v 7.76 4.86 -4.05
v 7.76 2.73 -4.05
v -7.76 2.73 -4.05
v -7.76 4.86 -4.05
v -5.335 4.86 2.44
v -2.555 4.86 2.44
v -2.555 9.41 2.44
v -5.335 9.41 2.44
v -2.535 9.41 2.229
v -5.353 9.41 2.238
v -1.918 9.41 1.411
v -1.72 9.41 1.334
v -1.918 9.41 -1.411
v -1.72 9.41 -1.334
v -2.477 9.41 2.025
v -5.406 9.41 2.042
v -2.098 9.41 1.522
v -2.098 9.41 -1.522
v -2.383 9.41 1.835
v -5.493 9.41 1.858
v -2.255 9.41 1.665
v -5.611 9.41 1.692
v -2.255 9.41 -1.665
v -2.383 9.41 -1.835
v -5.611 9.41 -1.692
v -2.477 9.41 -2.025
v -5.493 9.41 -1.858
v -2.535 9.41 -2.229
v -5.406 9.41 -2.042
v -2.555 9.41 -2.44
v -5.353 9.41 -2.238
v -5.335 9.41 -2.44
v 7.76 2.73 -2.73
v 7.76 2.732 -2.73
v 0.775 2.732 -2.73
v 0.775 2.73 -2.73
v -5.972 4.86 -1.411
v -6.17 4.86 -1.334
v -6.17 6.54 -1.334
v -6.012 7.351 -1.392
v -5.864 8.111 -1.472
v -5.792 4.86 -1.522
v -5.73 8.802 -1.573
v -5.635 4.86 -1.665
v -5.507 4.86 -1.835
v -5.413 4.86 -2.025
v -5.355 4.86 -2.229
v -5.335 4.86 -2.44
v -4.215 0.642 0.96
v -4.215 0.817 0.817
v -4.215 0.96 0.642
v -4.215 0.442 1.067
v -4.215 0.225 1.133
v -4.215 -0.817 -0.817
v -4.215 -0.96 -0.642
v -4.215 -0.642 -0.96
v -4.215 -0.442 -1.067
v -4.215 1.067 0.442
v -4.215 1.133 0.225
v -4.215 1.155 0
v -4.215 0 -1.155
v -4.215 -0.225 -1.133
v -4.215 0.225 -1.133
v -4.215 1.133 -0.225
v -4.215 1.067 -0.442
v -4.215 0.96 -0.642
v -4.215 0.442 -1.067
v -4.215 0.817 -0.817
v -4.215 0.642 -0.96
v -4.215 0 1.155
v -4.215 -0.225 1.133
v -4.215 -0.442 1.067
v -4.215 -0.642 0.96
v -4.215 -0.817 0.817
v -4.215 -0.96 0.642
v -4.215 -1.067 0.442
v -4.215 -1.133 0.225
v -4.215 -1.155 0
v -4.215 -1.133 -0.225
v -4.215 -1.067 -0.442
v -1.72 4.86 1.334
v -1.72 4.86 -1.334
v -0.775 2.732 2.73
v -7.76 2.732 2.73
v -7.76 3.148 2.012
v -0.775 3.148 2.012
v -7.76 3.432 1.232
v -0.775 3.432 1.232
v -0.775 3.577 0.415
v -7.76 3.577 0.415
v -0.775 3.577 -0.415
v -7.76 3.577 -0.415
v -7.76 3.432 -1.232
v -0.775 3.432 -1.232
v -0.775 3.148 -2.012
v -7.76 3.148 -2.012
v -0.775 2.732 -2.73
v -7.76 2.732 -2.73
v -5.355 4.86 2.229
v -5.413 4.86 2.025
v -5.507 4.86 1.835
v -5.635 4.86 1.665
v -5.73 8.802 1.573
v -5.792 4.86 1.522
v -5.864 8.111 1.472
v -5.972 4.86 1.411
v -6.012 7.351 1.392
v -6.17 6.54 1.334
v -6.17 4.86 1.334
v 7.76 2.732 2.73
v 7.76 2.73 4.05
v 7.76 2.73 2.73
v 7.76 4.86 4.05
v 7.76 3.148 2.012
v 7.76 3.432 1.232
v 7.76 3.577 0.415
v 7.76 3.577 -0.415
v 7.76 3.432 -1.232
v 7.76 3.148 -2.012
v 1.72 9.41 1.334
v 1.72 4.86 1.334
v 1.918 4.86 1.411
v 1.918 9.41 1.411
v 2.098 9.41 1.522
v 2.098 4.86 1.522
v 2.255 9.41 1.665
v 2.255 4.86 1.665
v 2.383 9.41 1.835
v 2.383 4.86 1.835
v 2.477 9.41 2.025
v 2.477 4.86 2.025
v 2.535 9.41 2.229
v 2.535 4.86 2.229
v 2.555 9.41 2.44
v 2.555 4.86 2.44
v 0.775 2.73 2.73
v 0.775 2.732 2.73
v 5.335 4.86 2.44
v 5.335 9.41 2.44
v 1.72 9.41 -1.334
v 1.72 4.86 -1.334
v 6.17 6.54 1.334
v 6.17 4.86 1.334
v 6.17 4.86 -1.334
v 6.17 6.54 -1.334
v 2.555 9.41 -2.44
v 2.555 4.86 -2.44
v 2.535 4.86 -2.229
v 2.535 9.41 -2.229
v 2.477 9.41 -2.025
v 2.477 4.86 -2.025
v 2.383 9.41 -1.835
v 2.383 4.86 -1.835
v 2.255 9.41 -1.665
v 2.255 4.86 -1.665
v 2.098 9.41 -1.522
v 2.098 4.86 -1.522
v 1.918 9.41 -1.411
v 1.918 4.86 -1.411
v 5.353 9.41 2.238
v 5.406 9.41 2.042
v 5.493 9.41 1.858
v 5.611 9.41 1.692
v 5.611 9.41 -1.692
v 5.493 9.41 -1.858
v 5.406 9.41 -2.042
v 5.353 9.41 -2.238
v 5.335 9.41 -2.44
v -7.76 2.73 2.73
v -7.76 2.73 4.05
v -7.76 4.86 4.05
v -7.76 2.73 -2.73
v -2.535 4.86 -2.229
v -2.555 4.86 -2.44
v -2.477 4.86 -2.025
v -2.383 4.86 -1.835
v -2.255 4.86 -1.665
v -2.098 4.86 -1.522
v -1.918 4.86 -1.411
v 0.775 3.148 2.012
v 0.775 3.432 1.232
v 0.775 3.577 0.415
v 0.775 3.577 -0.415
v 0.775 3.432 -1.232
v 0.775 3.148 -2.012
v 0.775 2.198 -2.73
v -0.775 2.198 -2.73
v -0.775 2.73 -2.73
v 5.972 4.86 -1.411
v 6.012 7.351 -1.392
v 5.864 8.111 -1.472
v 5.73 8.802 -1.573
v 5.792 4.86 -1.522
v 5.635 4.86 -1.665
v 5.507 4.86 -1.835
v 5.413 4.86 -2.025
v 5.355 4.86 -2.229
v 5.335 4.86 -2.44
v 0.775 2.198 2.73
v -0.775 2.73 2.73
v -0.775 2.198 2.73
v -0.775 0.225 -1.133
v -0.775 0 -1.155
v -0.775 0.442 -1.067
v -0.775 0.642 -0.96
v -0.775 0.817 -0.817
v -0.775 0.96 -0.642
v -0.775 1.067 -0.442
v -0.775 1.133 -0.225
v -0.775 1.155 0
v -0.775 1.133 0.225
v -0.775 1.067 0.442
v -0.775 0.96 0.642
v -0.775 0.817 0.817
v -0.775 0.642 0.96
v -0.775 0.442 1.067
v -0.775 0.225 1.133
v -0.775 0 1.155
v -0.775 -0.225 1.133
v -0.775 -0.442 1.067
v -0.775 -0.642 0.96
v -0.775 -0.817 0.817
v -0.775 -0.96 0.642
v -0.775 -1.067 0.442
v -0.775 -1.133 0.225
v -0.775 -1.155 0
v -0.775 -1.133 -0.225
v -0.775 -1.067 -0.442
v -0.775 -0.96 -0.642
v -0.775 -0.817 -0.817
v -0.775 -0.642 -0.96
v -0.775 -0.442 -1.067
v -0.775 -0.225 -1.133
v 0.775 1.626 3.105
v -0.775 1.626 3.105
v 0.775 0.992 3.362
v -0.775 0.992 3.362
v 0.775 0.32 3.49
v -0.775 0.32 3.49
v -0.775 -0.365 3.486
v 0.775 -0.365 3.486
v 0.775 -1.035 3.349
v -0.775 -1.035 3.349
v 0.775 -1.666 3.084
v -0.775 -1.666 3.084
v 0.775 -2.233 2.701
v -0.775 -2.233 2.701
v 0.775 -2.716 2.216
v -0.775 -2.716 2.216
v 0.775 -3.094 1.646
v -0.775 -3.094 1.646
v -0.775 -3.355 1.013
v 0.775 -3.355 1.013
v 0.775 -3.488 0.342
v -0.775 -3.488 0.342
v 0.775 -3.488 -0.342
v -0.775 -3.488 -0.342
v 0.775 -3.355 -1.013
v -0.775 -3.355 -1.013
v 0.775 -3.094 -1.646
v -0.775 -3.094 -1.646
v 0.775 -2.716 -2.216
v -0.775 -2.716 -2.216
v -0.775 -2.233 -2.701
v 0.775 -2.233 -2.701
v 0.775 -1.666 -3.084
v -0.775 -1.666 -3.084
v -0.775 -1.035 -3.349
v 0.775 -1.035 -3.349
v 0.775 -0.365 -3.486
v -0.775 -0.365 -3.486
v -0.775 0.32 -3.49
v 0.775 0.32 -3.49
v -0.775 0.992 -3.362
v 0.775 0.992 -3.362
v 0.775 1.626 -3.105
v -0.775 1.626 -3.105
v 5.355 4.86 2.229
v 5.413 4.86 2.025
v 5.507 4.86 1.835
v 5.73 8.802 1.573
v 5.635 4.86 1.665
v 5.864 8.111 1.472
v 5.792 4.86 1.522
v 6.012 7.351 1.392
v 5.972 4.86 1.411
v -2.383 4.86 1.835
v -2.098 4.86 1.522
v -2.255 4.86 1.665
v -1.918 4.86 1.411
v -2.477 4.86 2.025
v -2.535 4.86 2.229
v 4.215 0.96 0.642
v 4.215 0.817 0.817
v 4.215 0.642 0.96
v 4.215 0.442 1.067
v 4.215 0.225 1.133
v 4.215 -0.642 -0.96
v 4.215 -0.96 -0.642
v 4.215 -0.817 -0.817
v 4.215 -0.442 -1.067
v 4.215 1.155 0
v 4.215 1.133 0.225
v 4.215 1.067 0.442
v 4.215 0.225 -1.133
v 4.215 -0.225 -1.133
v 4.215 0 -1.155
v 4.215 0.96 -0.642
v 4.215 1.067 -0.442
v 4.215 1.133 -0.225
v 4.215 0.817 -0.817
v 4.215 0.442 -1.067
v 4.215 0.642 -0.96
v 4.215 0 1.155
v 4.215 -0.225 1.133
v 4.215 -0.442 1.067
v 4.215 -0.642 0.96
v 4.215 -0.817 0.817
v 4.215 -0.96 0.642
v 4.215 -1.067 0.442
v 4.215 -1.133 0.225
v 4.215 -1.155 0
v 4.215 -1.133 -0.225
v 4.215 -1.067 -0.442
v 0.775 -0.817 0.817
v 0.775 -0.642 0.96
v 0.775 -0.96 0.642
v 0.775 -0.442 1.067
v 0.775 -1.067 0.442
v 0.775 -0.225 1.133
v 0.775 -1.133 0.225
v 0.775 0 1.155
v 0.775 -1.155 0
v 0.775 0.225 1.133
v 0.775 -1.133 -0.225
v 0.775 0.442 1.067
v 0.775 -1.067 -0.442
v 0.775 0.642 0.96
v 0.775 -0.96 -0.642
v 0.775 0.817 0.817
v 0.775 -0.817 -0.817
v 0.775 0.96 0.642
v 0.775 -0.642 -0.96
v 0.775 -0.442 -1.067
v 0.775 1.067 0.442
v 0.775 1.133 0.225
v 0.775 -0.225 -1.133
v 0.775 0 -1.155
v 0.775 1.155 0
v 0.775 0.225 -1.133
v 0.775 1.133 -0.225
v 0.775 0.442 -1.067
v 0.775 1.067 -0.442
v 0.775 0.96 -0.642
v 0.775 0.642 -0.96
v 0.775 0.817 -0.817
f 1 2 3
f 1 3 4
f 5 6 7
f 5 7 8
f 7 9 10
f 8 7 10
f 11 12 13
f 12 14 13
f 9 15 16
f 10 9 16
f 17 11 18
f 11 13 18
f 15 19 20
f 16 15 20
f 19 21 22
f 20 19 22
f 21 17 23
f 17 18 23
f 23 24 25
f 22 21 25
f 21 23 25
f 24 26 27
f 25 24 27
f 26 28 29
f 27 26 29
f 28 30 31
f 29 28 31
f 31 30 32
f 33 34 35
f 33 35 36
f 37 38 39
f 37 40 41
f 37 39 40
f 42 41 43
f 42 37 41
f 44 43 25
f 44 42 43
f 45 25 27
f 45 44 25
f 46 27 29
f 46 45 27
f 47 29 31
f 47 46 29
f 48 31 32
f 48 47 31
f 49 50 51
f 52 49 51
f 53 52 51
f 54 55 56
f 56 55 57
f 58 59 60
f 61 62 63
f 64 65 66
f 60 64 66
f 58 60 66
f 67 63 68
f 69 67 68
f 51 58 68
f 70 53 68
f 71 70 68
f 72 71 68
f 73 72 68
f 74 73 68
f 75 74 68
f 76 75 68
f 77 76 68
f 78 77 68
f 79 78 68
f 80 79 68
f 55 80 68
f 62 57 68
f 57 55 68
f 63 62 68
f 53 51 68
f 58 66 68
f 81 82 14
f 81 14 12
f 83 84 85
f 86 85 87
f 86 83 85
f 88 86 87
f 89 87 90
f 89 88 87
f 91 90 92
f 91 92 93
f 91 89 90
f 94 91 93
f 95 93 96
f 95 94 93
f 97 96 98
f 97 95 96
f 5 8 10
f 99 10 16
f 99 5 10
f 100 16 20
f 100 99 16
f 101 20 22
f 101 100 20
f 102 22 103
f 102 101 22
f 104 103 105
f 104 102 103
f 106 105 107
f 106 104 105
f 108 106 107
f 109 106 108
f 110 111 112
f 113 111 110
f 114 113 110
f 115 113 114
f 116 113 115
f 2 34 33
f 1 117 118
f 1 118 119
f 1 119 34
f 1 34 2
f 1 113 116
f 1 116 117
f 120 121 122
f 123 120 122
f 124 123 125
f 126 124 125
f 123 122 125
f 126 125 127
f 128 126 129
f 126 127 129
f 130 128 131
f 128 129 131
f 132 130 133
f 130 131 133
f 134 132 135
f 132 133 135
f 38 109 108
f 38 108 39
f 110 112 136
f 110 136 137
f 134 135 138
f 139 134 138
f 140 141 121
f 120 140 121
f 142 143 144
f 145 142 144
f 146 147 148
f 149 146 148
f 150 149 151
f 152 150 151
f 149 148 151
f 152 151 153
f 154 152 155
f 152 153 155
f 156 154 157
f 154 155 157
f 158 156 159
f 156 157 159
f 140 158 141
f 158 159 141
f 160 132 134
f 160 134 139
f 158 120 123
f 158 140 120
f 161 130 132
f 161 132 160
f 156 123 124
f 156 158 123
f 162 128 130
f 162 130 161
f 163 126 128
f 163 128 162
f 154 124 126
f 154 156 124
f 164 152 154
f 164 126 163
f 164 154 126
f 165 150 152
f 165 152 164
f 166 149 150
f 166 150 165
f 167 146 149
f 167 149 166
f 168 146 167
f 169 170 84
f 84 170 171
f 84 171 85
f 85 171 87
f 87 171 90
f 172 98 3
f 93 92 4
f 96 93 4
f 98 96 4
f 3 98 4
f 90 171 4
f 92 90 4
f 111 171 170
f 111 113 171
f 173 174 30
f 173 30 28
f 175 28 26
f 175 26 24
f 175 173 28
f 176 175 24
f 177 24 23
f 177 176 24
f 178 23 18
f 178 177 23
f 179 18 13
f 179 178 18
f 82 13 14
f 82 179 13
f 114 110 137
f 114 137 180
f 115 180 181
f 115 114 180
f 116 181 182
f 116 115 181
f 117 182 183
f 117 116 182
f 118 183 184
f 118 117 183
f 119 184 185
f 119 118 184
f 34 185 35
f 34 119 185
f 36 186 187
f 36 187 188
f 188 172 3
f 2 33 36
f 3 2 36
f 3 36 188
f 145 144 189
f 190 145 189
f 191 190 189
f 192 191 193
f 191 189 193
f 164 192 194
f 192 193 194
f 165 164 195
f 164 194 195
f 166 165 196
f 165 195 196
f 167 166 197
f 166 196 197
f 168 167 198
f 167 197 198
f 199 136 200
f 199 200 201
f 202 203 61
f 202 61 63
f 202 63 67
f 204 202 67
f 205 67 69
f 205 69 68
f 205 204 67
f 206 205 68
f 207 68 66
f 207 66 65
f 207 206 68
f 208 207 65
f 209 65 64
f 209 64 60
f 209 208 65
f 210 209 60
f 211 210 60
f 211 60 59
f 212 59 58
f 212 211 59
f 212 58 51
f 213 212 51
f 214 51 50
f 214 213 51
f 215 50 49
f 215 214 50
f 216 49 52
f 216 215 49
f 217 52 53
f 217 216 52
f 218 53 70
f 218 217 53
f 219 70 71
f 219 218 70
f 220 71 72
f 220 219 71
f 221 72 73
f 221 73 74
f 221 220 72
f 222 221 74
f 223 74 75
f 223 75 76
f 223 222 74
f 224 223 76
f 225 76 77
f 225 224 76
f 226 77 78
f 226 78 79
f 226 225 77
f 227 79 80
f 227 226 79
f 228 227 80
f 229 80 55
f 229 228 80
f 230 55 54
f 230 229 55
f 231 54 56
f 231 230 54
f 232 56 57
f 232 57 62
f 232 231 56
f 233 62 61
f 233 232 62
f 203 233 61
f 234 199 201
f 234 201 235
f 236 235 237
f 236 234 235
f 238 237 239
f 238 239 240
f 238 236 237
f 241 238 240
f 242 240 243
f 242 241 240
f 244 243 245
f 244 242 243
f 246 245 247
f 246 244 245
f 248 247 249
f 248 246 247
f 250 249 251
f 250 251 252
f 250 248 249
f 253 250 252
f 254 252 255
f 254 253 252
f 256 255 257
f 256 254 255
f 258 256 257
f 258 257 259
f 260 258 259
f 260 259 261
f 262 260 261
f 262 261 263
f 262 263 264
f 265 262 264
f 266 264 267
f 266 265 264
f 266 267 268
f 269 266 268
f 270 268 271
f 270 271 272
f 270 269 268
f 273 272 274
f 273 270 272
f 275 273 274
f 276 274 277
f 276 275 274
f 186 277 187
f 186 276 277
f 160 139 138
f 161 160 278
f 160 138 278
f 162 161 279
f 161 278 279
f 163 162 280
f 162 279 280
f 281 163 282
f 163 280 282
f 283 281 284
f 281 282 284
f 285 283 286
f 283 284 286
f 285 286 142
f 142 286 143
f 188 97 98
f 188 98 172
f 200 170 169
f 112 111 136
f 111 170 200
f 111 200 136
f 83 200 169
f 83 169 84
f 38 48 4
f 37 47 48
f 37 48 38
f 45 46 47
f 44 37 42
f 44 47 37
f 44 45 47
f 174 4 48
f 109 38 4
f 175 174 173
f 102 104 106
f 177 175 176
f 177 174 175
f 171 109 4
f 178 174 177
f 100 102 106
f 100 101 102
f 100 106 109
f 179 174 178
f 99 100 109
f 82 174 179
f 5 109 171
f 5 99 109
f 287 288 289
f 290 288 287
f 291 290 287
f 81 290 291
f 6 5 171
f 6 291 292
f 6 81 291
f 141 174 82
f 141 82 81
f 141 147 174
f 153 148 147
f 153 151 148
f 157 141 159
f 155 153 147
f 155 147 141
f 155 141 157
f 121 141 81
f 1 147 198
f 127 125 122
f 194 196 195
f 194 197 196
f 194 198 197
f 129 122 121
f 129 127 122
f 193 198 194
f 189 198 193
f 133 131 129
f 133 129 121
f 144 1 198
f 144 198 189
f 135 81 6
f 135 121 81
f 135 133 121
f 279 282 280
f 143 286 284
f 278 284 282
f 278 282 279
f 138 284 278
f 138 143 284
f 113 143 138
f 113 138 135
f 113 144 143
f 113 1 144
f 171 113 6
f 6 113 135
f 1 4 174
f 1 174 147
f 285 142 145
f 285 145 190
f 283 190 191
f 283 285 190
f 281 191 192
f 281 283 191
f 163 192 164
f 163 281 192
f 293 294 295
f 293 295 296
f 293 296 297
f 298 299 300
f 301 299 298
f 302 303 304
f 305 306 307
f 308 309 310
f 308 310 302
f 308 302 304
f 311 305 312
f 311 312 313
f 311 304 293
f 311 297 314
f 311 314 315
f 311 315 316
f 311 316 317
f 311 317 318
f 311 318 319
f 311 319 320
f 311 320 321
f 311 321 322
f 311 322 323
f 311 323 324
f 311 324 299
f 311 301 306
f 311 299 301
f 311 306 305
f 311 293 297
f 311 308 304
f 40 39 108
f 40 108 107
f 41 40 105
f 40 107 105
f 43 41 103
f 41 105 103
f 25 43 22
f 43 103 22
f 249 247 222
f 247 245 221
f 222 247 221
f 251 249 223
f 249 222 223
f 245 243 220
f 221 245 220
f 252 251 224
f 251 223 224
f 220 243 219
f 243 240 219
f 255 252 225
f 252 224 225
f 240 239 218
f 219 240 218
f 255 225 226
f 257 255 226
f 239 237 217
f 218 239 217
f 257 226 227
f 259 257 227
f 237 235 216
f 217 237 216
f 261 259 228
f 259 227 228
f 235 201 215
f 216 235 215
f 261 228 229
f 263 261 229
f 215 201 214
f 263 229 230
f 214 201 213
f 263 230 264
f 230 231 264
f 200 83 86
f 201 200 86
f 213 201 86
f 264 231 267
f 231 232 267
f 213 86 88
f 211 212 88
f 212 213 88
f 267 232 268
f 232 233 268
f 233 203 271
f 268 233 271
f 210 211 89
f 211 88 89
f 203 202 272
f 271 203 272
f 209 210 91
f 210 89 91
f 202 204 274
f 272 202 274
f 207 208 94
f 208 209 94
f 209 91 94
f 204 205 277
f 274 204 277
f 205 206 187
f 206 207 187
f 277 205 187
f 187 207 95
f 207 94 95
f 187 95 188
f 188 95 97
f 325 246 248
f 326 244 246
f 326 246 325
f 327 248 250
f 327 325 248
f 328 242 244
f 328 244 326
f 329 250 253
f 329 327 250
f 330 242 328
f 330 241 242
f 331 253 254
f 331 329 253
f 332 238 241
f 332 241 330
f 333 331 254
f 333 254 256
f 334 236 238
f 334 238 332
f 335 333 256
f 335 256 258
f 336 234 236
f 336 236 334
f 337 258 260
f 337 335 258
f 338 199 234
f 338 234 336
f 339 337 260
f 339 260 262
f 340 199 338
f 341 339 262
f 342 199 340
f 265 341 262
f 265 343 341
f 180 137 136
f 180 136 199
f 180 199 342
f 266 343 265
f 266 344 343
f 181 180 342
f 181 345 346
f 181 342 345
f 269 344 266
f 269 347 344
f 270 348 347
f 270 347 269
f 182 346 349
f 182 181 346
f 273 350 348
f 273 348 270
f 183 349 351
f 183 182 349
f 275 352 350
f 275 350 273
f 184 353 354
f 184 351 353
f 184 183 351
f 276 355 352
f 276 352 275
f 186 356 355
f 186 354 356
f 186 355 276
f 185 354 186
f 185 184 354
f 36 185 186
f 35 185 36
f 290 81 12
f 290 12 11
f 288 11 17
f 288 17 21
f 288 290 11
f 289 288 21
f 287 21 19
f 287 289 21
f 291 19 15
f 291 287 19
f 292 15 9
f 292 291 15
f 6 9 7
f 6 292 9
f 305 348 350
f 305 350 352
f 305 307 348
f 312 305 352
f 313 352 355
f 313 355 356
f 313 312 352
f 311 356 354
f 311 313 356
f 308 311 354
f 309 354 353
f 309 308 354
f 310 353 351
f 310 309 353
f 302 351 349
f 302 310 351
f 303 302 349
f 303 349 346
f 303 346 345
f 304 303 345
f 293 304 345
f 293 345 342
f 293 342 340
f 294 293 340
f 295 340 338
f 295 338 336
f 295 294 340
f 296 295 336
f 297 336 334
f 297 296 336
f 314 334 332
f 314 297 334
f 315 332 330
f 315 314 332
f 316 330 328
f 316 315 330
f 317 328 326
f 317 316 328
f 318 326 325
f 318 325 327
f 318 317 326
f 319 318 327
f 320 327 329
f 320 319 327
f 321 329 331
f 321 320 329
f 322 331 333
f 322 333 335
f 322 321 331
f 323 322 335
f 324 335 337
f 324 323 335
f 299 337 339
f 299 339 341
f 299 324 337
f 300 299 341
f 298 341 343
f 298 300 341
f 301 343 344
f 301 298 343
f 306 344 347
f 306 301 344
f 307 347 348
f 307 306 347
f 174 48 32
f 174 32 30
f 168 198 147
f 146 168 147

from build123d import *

# Parameters (mm, degrees)
EXTRUDE_1_DEPTH     = 0.775
SKETCH_2_R          = 1.155
EXTRUDE_2_DEPTH     = 4.215
EXTRUDE_3_DEPTH     = 7.76
EXTRUDE_4_DEPTH     = 4.55
CUT_EXTRUDE_1_DEPTH = 2.5


with BuildPart() as part:
    # 스케치1 → 보스-돌출1 (new body, symmetric)
    with BuildSketch(Plane(origin=(0, 0, 0), x_dir=(0, 0, -1), z_dir=(1, 0, 0))):
        with BuildLine():
            Line((-2.73, 2.732106893), (-2.73, 2.198209499))
            ThreePointArc((-2.73, 2.198209499), (0, -3.505), (2.73, 2.198209499))
            Line((2.73, 2.198209499), (2.73, 2.732106893))
            ThreePointArc((2.73, 2.732106893), (0, 3.595), (-2.73, 2.732106893))
        make_face()
    extrude(amount=EXTRUDE_1_DEPTH, both=True)

    # 스케치2 → 보스-돌출2 (add, symmetric)
    with BuildSketch(Plane(origin=(0, 0, 0), x_dir=(0, 0, -1), z_dir=(1, 0, 0))):
        Circle(SKETCH_2_R)
    extrude(amount=EXTRUDE_2_DEPTH, both=True)

    # 스케치3 → 보스-돌출3 (add, symmetric)
    with BuildSketch(Plane(origin=(0, 0, 0), x_dir=(0, 0, -1), z_dir=(1, 0, 0))):
        with BuildLine():
            Line((-4.05, 2.73), (-2.73, 2.73))
            Line((-2.73, 2.73), (-2.73, 2.732106893))
            ThreePointArc((-2.73, 2.732106893), (0, 3.595), (2.73, 2.732106893))
            Line((2.73, 2.732106893), (2.73, 2.73))
            Line((2.73, 2.73), (4.05, 2.73))
            Line((4.05, 2.73), (4.05, 4.86))
            Line((4.05, 4.86), (-4.05, 4.86))
            Line((-4.05, 4.86), (-4.05, 2.73))
        make_face()
    extrude(amount=EXTRUDE_3_DEPTH, both=True)

    # 스케치4 → 보스-돌출4 (add)
    with BuildSketch(Plane(origin=(0, 4.86, 0), x_dir=(1, 0, 0), z_dir=(0, 1, 0))):
        with BuildLine():
            Line((-2.555, -2.44), (-5.335, -2.44))
            ThreePointArc((-5.335, -2.44), (-5.567190107, -1.747089472), (-6.17, -1.333982369))
            Line((-6.17, -1.333982369), (-6.17, 1.333982369))
            ThreePointArc((-6.17, 1.333982369), (-5.567190107, 1.747089472), (-5.335, 2.44))
            Line((-5.335, 2.44), (-2.555, 2.44))
            ThreePointArc((-2.555, 2.44), (-2.322809893, 1.747089472), (-1.72, 1.333982369))
            Line((-1.72, 1.333982369), (-1.72, -1.333982369))
            ThreePointArc((-1.72, -1.333982369), (-2.322809893, -1.747089472), (-2.555, -2.44))
        make_face()
    extrude_4 = extrude(amount=EXTRUDE_4_DEPTH)

    # 스케치5 → 컷-돌출1 (cut, symmetric)
    with BuildSketch(Plane.XY):
        Polygon((-6.17, 6.54), (-5.611088771, 9.41), (-6.17, 9.41), align=None)
    cut_extrude_1 = extrude(amount=CUT_EXTRUDE_1_DEPTH, both=True, mode=Mode.SUBTRACT)

    # 대칭 복사1: 보스-돌출4, 컷-돌출1 across plane
    add(extrude_4.mirror(Plane(origin=(0, 0, 0), x_dir=(0, 0, 1), z_dir=(1, 0, 0))))
    add(cut_extrude_1.mirror(Plane(origin=(0, 0, 0), x_dir=(0, 0, 1), z_dir=(1, 0, 0))), mode=Mode.SUBTRACT)


solid = part.part
